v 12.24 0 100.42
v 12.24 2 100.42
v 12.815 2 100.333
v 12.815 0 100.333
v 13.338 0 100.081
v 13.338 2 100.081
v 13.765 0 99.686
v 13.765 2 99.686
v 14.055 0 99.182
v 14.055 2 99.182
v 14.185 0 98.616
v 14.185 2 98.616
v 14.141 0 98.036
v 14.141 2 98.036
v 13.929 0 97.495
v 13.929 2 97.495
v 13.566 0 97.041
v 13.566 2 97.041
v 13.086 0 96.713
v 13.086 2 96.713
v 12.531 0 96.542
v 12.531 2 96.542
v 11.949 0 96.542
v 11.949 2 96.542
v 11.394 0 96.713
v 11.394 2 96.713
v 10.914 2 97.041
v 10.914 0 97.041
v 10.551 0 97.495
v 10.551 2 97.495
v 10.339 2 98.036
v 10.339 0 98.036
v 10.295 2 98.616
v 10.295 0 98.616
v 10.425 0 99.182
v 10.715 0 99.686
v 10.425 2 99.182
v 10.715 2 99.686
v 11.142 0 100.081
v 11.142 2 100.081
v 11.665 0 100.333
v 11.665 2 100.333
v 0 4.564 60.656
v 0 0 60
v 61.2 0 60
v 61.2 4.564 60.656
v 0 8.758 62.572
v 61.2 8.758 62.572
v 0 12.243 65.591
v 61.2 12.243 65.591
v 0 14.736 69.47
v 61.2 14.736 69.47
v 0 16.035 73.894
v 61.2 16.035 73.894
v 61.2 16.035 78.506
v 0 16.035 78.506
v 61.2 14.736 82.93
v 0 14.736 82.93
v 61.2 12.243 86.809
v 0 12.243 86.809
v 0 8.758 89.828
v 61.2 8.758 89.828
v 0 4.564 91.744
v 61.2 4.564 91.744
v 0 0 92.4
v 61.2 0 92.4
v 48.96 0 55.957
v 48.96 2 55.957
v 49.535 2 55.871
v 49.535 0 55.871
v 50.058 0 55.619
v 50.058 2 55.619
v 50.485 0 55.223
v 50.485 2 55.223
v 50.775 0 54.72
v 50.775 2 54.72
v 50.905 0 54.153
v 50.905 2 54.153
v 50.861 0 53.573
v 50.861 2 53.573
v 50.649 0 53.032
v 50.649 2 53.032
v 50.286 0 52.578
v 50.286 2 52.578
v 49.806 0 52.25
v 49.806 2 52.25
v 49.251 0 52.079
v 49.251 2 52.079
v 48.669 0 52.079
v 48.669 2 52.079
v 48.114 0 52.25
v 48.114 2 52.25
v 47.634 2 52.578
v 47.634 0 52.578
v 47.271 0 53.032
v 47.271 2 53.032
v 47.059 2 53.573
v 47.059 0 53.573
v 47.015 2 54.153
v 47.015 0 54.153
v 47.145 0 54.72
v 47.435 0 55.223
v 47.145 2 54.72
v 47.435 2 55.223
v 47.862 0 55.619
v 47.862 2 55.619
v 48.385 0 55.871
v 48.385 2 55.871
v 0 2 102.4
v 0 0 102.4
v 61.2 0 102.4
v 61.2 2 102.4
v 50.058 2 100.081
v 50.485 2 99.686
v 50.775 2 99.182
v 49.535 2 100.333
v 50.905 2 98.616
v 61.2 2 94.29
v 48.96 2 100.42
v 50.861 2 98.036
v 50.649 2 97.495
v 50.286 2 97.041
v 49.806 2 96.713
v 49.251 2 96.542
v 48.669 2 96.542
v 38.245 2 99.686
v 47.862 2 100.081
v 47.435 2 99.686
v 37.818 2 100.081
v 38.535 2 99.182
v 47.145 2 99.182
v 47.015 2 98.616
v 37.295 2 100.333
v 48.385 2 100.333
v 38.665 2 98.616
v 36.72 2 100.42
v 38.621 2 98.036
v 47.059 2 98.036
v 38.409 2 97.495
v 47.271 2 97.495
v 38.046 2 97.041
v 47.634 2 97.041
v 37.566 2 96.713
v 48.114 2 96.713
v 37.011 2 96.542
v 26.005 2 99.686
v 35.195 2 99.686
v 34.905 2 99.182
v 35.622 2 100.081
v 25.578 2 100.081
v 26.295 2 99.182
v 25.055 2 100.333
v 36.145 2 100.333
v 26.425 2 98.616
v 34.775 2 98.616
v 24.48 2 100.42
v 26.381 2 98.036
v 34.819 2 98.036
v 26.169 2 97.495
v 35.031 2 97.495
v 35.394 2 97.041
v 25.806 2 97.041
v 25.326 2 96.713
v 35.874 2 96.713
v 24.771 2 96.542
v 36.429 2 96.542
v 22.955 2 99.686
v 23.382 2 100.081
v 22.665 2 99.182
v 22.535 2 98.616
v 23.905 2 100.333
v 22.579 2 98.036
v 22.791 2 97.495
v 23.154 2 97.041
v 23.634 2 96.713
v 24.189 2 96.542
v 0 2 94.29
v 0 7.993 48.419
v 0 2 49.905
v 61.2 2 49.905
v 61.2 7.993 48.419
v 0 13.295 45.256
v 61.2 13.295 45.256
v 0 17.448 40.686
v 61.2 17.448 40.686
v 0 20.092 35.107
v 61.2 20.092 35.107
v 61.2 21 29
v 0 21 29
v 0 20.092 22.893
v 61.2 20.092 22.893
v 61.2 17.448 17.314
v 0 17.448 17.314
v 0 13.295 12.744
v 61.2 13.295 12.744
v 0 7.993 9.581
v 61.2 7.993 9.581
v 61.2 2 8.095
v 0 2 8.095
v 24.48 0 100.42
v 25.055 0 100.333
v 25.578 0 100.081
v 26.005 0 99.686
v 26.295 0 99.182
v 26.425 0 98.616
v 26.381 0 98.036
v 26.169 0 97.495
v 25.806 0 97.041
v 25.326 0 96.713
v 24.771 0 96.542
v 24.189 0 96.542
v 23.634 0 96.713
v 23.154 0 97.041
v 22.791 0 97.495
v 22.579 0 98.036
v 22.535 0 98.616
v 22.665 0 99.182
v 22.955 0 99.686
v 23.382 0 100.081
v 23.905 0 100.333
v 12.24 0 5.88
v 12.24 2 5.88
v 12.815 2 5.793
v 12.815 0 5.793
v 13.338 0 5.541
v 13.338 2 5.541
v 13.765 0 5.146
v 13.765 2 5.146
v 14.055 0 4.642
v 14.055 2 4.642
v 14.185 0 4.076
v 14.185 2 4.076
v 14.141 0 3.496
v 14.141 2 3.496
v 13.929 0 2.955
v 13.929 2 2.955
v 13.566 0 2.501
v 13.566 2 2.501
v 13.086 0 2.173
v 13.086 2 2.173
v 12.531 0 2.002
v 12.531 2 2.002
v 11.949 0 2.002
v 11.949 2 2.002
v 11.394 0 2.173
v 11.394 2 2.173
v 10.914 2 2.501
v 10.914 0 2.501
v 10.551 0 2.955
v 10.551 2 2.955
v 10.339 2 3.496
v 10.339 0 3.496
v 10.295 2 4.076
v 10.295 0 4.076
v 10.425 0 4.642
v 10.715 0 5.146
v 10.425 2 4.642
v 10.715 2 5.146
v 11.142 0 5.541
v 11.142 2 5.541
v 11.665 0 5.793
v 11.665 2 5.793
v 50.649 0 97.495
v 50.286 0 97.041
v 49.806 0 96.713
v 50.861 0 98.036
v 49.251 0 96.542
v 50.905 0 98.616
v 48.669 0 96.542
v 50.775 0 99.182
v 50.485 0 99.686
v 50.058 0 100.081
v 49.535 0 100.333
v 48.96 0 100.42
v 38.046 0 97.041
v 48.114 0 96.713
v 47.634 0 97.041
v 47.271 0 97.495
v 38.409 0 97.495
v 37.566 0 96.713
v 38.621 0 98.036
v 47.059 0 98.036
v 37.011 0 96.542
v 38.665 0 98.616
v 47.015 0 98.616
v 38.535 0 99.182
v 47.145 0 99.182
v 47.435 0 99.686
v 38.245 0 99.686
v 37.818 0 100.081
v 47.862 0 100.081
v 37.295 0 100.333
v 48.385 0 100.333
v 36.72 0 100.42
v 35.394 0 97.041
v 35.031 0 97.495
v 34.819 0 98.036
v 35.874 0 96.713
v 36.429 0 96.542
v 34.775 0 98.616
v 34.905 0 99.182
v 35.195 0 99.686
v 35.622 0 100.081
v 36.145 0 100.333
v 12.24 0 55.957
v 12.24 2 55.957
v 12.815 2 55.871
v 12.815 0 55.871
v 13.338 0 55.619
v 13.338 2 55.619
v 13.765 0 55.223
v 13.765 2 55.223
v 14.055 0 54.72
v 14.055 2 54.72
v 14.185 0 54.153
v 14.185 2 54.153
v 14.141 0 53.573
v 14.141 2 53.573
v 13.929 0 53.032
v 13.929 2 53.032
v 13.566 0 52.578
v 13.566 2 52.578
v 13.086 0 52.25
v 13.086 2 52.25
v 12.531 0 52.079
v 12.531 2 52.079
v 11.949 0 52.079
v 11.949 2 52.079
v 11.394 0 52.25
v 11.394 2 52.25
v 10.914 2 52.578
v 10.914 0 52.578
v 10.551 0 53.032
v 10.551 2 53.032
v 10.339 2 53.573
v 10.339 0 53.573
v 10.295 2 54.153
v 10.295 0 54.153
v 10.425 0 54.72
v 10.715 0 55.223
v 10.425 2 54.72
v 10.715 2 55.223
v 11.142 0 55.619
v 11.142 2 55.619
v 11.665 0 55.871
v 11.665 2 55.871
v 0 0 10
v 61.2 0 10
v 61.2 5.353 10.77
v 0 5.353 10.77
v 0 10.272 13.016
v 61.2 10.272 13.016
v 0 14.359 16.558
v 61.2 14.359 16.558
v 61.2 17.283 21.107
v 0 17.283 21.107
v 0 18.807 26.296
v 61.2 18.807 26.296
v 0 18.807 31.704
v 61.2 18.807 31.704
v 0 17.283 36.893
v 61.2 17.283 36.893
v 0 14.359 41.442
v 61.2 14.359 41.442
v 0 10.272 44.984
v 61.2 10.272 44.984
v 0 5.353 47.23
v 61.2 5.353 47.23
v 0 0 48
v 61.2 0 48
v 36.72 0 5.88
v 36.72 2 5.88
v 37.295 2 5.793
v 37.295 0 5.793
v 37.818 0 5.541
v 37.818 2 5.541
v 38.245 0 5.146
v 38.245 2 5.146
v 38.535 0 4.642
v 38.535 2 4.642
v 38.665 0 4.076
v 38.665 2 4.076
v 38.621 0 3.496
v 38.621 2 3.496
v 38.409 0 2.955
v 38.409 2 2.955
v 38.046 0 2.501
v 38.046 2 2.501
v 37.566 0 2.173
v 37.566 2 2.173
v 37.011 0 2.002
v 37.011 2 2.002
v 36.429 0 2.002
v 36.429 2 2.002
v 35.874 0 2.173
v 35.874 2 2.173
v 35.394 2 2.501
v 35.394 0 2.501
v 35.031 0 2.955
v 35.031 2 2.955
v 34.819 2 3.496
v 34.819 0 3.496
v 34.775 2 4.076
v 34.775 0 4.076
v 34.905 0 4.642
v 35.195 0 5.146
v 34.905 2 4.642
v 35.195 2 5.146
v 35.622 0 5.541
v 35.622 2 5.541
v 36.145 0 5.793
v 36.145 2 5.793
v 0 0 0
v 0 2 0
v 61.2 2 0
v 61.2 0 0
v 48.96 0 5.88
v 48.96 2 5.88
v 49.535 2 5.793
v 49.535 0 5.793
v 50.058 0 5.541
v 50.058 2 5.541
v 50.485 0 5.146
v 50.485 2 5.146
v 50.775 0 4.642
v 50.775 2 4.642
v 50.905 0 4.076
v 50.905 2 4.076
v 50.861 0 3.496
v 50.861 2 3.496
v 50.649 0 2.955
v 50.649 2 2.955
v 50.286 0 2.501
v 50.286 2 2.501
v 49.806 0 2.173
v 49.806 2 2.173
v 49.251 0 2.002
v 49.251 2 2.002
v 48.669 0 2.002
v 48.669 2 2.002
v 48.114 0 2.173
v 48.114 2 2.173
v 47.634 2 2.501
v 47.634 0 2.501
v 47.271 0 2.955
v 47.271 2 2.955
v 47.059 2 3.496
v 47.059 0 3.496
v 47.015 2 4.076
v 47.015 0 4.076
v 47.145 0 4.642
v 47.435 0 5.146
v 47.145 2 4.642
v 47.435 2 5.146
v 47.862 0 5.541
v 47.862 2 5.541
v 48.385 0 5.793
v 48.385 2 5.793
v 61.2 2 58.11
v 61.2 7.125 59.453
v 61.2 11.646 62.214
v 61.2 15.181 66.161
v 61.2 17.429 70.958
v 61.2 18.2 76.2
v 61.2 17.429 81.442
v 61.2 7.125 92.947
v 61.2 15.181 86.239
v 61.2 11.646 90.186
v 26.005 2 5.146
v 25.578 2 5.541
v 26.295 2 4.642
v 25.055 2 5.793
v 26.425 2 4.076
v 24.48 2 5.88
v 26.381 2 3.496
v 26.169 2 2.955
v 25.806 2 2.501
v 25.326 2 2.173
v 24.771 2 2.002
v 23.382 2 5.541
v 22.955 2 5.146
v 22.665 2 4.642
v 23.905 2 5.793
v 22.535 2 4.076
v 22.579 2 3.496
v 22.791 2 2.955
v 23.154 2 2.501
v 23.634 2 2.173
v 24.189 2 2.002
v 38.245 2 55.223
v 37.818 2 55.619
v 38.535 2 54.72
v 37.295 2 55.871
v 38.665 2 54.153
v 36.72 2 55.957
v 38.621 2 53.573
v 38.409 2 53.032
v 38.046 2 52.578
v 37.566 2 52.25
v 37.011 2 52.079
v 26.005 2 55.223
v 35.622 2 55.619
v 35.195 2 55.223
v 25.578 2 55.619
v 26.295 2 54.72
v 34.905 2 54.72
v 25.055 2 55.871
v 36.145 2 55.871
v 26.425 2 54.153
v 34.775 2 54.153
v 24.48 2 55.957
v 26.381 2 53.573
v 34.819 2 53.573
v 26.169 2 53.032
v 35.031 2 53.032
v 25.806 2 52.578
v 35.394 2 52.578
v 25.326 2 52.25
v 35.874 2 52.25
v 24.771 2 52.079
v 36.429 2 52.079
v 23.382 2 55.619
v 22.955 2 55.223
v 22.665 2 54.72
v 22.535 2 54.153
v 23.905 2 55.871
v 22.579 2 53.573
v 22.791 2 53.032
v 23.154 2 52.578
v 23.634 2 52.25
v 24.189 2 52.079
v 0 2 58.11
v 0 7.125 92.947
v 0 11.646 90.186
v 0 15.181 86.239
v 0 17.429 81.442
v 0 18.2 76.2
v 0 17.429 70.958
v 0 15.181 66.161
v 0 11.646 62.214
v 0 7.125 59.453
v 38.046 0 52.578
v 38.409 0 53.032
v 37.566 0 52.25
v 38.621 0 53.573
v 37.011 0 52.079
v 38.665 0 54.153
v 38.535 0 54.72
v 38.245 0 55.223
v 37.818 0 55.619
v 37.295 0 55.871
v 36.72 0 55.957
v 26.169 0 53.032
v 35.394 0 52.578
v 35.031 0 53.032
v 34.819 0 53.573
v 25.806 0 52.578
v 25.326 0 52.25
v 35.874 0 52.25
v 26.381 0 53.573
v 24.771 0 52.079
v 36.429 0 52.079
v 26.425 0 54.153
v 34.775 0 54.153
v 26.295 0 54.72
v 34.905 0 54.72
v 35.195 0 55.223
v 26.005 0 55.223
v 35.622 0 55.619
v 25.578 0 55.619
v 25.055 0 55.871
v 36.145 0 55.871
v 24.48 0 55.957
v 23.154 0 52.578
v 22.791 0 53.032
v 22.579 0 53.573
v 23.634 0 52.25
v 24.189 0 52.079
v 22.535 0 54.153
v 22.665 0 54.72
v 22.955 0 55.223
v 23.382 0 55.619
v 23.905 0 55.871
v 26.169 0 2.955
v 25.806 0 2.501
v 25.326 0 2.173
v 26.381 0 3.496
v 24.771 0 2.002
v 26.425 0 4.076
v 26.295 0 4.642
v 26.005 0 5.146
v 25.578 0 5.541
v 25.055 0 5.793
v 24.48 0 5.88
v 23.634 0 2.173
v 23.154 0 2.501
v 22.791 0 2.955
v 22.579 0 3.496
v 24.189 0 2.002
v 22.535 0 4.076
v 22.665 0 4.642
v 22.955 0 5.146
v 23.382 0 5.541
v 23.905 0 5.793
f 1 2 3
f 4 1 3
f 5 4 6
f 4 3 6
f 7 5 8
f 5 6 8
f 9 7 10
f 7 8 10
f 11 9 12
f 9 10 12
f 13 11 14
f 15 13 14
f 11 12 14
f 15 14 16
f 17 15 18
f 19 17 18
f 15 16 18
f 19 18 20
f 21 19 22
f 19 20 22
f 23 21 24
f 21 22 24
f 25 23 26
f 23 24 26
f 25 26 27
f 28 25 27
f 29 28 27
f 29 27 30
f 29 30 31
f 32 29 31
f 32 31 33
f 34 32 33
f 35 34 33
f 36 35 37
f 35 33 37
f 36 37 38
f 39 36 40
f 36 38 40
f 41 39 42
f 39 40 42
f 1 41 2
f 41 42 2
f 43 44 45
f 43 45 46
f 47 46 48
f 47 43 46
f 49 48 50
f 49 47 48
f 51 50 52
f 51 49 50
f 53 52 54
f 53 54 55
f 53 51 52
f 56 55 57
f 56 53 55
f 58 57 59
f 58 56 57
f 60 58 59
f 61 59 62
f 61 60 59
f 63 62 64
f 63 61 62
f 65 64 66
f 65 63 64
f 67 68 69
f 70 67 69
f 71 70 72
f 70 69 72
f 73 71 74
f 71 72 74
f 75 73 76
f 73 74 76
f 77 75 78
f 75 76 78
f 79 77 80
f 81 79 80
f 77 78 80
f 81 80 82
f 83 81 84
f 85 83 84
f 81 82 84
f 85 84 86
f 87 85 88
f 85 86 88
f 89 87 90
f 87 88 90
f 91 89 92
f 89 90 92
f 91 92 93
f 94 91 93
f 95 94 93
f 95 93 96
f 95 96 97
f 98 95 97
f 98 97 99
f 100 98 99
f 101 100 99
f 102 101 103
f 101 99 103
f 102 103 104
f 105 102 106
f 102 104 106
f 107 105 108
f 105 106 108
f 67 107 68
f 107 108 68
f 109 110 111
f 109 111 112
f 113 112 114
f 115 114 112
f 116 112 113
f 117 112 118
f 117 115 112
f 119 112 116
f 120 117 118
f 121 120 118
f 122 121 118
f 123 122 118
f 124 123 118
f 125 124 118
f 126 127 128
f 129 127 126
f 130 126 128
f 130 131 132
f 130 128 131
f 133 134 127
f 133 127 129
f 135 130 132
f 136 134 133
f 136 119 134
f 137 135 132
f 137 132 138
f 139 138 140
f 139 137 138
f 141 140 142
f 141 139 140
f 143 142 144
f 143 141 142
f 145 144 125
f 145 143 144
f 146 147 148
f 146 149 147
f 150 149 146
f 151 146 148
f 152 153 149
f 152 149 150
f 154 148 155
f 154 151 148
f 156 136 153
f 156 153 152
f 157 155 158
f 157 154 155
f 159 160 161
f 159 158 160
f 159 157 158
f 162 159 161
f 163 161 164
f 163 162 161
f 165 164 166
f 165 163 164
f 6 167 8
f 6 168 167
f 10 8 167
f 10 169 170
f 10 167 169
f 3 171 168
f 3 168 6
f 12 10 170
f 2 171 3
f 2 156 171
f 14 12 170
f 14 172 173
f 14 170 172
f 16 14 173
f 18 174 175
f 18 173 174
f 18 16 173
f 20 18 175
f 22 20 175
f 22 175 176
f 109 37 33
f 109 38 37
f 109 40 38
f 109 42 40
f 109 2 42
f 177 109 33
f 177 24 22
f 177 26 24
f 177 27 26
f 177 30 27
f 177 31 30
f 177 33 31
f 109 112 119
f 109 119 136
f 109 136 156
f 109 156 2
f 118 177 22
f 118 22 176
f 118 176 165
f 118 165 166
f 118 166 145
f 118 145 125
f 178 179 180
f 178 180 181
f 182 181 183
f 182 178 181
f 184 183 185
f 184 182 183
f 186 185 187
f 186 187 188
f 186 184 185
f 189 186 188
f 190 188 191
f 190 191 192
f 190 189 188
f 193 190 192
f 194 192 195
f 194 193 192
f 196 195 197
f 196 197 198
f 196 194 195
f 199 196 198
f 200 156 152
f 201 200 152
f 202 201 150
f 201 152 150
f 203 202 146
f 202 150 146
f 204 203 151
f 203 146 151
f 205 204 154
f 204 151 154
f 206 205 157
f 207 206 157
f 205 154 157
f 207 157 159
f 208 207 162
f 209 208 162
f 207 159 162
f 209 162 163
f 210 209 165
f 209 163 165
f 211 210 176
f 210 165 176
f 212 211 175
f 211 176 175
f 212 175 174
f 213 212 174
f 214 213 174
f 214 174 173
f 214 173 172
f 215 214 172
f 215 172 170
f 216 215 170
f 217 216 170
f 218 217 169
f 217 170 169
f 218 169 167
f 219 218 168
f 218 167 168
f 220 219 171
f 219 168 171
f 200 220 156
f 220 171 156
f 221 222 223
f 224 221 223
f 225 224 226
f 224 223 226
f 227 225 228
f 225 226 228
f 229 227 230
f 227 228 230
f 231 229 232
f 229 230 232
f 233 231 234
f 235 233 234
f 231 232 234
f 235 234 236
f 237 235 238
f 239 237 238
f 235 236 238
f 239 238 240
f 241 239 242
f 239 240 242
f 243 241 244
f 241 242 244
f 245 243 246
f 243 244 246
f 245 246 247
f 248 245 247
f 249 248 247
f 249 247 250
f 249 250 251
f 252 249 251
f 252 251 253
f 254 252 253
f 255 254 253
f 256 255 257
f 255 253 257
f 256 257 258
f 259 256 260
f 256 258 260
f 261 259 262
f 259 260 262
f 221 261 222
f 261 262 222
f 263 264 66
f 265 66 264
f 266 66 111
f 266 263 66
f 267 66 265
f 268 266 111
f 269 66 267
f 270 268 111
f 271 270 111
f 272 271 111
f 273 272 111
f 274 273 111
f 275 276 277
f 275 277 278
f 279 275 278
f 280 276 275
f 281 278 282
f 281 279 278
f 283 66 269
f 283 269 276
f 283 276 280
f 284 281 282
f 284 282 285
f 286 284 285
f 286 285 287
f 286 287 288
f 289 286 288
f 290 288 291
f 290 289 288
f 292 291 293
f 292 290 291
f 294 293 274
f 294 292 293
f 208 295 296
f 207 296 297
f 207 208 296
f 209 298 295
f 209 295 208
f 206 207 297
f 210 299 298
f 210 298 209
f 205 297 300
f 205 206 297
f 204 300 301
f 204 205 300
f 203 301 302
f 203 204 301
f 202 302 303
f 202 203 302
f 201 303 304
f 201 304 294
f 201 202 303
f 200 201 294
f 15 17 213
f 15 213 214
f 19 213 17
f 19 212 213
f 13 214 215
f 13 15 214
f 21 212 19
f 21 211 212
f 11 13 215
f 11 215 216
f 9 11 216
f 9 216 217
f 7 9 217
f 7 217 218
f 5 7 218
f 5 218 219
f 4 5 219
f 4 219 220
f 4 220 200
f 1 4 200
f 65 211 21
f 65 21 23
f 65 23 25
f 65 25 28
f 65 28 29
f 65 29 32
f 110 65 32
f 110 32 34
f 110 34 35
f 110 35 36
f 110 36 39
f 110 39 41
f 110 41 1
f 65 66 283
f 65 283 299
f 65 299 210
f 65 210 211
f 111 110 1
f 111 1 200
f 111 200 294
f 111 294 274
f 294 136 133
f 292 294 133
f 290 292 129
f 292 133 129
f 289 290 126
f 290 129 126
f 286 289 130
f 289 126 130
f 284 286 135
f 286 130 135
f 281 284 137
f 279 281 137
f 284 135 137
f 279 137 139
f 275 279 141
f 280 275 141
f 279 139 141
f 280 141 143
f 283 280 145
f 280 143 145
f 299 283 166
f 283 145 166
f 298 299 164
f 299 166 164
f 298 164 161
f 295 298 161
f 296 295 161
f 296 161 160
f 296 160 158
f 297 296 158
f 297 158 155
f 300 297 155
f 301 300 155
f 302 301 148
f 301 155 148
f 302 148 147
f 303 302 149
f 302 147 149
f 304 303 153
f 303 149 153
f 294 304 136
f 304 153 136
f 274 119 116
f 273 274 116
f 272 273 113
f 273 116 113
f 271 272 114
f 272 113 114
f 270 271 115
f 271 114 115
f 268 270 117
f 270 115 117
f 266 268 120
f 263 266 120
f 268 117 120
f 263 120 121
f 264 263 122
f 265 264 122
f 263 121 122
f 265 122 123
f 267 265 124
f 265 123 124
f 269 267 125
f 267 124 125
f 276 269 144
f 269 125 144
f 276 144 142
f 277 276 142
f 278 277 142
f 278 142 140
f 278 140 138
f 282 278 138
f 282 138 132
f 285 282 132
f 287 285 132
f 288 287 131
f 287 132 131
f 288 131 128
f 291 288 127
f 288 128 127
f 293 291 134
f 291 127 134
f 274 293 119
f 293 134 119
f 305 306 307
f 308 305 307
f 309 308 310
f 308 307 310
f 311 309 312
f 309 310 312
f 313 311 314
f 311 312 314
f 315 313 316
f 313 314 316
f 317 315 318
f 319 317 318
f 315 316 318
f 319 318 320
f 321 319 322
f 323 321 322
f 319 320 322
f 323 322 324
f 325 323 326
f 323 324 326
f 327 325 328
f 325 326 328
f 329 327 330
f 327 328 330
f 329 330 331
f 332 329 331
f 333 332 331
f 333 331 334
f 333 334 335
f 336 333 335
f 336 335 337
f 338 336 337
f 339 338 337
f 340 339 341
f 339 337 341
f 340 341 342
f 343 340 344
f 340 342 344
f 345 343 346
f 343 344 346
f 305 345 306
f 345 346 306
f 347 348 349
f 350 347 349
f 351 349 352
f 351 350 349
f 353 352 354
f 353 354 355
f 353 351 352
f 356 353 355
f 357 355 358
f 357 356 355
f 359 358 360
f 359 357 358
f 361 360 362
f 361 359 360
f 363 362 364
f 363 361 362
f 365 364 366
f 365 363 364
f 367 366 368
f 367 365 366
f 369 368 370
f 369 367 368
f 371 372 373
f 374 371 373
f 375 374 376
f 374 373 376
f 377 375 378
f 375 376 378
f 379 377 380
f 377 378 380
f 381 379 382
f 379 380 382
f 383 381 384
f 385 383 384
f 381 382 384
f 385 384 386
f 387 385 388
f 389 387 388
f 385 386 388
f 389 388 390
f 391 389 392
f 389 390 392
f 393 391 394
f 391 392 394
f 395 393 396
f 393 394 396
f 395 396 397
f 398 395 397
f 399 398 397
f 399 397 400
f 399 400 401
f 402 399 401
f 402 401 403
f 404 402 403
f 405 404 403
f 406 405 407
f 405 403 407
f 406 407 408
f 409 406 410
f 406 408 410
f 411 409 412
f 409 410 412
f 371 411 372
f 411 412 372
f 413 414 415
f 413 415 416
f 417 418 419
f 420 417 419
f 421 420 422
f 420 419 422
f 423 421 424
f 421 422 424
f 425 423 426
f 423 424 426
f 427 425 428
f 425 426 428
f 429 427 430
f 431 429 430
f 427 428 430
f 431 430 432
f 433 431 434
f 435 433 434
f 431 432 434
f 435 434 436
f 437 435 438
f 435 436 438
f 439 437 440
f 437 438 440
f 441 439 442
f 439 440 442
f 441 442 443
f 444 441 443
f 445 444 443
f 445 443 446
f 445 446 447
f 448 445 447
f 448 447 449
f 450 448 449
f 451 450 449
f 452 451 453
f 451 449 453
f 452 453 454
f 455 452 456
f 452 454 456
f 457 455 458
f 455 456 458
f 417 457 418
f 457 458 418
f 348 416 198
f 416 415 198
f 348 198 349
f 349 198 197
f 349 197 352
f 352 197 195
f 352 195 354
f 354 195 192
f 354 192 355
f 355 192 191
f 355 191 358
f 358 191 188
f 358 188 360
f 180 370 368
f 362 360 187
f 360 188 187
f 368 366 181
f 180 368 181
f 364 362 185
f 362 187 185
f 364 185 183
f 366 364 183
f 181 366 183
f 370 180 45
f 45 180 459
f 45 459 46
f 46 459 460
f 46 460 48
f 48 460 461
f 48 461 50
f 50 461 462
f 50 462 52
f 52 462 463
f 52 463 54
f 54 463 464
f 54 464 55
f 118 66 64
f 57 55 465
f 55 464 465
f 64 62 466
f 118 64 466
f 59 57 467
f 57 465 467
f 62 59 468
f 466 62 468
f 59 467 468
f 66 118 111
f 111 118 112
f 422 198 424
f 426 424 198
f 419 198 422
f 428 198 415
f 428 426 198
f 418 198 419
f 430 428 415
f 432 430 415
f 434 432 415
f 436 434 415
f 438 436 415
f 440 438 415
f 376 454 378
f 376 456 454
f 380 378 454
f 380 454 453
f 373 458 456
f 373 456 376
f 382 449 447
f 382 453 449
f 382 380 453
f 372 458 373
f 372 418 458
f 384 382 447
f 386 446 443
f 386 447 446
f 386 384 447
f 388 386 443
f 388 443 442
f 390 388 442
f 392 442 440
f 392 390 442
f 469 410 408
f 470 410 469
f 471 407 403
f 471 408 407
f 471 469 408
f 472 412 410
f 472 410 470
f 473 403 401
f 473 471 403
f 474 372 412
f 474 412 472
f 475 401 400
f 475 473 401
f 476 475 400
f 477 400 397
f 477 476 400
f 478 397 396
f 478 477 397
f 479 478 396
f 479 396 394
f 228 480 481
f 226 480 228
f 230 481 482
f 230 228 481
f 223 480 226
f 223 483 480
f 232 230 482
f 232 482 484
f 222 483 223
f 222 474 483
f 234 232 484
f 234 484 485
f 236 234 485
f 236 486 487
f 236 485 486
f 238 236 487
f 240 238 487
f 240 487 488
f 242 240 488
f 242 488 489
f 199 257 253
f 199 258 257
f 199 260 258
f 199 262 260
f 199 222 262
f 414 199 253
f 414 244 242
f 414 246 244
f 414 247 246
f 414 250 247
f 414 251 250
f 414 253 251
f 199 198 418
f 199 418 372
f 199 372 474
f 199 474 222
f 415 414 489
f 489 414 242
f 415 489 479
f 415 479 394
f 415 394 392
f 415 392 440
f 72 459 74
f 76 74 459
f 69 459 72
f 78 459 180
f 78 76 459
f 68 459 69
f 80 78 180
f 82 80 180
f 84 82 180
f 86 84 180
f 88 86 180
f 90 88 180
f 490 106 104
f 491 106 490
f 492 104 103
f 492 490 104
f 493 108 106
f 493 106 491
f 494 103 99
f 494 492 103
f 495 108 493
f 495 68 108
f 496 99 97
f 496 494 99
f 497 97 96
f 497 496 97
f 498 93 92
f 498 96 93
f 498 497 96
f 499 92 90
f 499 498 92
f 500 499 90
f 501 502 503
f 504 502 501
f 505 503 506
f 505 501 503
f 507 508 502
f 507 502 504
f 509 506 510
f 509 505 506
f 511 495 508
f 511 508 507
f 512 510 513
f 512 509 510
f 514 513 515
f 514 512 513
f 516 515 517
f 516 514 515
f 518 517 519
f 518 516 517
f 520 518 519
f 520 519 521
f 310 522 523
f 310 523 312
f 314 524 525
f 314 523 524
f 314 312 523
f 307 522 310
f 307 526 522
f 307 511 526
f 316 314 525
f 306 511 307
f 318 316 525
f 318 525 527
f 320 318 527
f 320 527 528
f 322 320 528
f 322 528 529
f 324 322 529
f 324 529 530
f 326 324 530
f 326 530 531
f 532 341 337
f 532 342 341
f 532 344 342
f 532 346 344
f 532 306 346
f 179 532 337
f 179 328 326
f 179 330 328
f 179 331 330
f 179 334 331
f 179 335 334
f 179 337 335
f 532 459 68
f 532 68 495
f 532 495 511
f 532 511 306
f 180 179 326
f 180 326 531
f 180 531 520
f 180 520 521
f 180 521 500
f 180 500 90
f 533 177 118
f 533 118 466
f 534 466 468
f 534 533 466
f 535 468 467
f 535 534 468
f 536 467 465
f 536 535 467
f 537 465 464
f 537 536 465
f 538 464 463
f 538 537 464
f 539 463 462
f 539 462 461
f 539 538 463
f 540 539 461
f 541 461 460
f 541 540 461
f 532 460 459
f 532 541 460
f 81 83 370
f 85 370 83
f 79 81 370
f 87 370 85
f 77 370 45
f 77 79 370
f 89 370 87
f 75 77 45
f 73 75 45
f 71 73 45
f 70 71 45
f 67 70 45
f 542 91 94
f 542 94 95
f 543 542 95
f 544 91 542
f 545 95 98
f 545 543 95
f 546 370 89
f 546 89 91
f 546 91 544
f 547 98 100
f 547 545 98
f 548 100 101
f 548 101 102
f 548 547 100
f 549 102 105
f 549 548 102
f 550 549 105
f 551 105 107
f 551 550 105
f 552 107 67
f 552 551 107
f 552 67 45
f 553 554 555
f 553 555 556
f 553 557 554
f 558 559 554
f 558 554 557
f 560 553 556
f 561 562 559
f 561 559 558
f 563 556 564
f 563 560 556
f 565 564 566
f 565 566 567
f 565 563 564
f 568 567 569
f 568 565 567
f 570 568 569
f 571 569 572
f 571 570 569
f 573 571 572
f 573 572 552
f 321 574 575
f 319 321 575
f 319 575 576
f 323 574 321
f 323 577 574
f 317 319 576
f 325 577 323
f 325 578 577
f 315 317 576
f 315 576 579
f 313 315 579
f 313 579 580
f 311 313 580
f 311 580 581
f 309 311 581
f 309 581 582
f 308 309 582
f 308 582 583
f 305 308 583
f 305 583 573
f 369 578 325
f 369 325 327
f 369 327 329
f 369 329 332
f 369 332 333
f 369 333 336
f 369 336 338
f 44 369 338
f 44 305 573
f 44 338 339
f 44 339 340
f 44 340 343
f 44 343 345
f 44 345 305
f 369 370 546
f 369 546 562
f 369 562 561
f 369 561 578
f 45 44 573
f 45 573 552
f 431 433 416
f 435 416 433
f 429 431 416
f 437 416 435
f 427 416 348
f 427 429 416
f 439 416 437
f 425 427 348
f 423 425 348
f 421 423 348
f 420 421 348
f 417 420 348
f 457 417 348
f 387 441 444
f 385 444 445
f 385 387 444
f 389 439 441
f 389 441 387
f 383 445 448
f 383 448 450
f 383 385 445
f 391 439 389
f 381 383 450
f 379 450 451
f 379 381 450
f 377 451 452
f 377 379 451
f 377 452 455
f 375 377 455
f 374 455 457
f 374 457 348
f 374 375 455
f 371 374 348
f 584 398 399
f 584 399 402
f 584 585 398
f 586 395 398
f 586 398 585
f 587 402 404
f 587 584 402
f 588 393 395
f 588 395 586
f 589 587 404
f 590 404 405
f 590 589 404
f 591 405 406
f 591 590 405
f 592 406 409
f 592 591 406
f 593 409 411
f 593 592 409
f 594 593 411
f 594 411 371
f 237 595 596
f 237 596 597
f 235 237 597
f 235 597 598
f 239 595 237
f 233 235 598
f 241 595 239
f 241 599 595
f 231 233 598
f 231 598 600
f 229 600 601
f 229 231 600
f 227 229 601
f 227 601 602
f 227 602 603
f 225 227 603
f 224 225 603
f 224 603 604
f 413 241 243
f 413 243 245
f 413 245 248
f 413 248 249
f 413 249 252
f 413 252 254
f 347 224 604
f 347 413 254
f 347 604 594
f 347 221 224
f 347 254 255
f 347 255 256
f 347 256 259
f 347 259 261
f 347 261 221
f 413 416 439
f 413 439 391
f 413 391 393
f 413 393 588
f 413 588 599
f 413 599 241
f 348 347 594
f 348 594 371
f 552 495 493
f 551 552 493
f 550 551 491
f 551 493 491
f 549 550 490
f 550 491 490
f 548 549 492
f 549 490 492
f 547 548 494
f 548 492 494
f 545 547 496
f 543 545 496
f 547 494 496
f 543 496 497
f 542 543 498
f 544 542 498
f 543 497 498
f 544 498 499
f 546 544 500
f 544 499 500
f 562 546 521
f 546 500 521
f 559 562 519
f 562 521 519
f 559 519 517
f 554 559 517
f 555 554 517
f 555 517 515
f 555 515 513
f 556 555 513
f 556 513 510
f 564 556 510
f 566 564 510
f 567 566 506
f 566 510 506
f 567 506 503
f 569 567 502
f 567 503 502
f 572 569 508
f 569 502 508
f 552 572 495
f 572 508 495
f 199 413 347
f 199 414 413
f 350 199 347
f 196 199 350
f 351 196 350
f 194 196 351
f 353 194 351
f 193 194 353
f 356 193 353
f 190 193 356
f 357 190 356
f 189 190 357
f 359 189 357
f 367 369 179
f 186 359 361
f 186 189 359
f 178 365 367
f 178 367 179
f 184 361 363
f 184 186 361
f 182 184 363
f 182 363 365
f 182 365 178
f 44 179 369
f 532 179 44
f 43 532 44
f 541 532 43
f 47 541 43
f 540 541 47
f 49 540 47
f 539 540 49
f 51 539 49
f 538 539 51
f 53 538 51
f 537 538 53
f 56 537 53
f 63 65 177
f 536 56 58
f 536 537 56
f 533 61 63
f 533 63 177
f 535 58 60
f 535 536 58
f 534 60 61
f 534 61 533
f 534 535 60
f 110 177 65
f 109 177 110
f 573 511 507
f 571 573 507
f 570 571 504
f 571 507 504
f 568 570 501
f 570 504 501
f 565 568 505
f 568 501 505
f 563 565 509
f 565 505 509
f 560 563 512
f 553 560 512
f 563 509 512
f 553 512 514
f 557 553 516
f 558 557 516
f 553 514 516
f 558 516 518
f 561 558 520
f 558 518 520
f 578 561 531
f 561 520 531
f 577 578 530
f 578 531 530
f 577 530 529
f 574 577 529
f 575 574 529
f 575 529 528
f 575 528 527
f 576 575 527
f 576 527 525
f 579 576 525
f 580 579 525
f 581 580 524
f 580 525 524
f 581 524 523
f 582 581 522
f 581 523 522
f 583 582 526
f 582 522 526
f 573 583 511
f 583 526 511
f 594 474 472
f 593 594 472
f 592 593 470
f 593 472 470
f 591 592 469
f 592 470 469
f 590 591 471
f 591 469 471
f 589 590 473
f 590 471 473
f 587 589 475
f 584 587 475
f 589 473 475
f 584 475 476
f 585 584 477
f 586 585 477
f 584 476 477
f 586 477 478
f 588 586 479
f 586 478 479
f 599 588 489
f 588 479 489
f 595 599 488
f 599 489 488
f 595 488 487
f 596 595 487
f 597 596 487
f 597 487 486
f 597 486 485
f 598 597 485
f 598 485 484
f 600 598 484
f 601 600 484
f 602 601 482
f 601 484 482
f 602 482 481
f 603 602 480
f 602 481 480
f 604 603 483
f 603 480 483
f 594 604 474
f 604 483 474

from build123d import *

# Parameters (mm, degrees)
BOSS_EXTRUDE1_DEPTH = 61.2
SKETCH3_R           = 1.95
CUT_EXTRUDE1_DEPTH  = 2


with BuildPart() as part:
    # Sketch2 → Boss-Extrude1 (new body)
    with BuildSketch(Plane(origin=(0, 0, 0), x_dir=(0, 0, -1), z_dir=(1, 0, 0))):
        with BuildLine():
            Line((0, 0), (-10, 0))
            ThreePointArc((-10, 0), (-29, 19), (-48, 0))
            Line((-48, 0), (-60, 0))
            ThreePointArc((-60, 0), (-76.2, 16.2), (-92.4, 0))
            Line((-92.4, 0), (-102.4, 0))
            Line((-102.4, 0), (-102.4, 2))
            Line((-102.4, 2), (-94.289776118, 2))
            ThreePointArc((-94.289776118, 2), (-76.2, 18.2), (-58.110223882, 2))
            Line((-58.110223882, 2), (-49.90454496, 2))
            ThreePointArc((-49.90454496, 2), (-29, 21), (-8.09545504, 2))
            Line((-8.09545504, 2), (0, 2))
            Line((0, 2), (0, 0))
        make_face()
    extrude(amount=BOSS_EXTRUDE1_DEPTH)

    # Sketch3 → Cut-Extrude1 (cut)
    with BuildSketch(Plane(origin=(0, 2, 0), x_dir=(1, 0, 0), z_dir=(0, 1, 0))):
        with Locations(Location((12.24, -3.93, 0), (0, 0, 270))):
            Circle(SKETCH3_R)
        with Locations(Location((24.48, -3.93, 0), (0, 0, 270))):
            Circle(SKETCH3_R)
        with Locations(Location((36.72, -3.93, 0), (0, 0, 270))):
            Circle(SKETCH3_R)
        with Locations(Location((48.96, -3.93, 0), (0, 0, 270))):
            Circle(SKETCH3_R)
        with Locations(Location((12.24, -54.007384421, 0), (0, 0, 270))):
            Circle(SKETCH3_R)
        with Locations(Location((24.48, -54.007384421, 0), (0, 0, 270))):
            Circle(SKETCH3_R)
        with Locations(Location((36.72, -54.007384421, 0), (0, 0, 270))):
            Circle(SKETCH3_R)
        with Locations(Location((48.96, -54.007384421, 0), (0, 0, 270))):
            Circle(SKETCH3_R)
        with Locations(Location((12.24, -98.47, 0), (0, 0, 270))):
            Circle(SKETCH3_R)
        with Locations(Location((24.48, -98.47, 0), (0, 0, 270))):
            Circle(SKETCH3_R)
        with Locations(Location((36.72, -98.47, 0), (0, 0, 270))):
            Circle(SKETCH3_R)
        with Locations(Location((48.96, -98.47, 0), (0, 0, 270))):
            Circle(SKETCH3_R)
    extrude(amount=-CUT_EXTRUDE1_DEPTH, mode=Mode.SUBTRACT)


solid = part.part
